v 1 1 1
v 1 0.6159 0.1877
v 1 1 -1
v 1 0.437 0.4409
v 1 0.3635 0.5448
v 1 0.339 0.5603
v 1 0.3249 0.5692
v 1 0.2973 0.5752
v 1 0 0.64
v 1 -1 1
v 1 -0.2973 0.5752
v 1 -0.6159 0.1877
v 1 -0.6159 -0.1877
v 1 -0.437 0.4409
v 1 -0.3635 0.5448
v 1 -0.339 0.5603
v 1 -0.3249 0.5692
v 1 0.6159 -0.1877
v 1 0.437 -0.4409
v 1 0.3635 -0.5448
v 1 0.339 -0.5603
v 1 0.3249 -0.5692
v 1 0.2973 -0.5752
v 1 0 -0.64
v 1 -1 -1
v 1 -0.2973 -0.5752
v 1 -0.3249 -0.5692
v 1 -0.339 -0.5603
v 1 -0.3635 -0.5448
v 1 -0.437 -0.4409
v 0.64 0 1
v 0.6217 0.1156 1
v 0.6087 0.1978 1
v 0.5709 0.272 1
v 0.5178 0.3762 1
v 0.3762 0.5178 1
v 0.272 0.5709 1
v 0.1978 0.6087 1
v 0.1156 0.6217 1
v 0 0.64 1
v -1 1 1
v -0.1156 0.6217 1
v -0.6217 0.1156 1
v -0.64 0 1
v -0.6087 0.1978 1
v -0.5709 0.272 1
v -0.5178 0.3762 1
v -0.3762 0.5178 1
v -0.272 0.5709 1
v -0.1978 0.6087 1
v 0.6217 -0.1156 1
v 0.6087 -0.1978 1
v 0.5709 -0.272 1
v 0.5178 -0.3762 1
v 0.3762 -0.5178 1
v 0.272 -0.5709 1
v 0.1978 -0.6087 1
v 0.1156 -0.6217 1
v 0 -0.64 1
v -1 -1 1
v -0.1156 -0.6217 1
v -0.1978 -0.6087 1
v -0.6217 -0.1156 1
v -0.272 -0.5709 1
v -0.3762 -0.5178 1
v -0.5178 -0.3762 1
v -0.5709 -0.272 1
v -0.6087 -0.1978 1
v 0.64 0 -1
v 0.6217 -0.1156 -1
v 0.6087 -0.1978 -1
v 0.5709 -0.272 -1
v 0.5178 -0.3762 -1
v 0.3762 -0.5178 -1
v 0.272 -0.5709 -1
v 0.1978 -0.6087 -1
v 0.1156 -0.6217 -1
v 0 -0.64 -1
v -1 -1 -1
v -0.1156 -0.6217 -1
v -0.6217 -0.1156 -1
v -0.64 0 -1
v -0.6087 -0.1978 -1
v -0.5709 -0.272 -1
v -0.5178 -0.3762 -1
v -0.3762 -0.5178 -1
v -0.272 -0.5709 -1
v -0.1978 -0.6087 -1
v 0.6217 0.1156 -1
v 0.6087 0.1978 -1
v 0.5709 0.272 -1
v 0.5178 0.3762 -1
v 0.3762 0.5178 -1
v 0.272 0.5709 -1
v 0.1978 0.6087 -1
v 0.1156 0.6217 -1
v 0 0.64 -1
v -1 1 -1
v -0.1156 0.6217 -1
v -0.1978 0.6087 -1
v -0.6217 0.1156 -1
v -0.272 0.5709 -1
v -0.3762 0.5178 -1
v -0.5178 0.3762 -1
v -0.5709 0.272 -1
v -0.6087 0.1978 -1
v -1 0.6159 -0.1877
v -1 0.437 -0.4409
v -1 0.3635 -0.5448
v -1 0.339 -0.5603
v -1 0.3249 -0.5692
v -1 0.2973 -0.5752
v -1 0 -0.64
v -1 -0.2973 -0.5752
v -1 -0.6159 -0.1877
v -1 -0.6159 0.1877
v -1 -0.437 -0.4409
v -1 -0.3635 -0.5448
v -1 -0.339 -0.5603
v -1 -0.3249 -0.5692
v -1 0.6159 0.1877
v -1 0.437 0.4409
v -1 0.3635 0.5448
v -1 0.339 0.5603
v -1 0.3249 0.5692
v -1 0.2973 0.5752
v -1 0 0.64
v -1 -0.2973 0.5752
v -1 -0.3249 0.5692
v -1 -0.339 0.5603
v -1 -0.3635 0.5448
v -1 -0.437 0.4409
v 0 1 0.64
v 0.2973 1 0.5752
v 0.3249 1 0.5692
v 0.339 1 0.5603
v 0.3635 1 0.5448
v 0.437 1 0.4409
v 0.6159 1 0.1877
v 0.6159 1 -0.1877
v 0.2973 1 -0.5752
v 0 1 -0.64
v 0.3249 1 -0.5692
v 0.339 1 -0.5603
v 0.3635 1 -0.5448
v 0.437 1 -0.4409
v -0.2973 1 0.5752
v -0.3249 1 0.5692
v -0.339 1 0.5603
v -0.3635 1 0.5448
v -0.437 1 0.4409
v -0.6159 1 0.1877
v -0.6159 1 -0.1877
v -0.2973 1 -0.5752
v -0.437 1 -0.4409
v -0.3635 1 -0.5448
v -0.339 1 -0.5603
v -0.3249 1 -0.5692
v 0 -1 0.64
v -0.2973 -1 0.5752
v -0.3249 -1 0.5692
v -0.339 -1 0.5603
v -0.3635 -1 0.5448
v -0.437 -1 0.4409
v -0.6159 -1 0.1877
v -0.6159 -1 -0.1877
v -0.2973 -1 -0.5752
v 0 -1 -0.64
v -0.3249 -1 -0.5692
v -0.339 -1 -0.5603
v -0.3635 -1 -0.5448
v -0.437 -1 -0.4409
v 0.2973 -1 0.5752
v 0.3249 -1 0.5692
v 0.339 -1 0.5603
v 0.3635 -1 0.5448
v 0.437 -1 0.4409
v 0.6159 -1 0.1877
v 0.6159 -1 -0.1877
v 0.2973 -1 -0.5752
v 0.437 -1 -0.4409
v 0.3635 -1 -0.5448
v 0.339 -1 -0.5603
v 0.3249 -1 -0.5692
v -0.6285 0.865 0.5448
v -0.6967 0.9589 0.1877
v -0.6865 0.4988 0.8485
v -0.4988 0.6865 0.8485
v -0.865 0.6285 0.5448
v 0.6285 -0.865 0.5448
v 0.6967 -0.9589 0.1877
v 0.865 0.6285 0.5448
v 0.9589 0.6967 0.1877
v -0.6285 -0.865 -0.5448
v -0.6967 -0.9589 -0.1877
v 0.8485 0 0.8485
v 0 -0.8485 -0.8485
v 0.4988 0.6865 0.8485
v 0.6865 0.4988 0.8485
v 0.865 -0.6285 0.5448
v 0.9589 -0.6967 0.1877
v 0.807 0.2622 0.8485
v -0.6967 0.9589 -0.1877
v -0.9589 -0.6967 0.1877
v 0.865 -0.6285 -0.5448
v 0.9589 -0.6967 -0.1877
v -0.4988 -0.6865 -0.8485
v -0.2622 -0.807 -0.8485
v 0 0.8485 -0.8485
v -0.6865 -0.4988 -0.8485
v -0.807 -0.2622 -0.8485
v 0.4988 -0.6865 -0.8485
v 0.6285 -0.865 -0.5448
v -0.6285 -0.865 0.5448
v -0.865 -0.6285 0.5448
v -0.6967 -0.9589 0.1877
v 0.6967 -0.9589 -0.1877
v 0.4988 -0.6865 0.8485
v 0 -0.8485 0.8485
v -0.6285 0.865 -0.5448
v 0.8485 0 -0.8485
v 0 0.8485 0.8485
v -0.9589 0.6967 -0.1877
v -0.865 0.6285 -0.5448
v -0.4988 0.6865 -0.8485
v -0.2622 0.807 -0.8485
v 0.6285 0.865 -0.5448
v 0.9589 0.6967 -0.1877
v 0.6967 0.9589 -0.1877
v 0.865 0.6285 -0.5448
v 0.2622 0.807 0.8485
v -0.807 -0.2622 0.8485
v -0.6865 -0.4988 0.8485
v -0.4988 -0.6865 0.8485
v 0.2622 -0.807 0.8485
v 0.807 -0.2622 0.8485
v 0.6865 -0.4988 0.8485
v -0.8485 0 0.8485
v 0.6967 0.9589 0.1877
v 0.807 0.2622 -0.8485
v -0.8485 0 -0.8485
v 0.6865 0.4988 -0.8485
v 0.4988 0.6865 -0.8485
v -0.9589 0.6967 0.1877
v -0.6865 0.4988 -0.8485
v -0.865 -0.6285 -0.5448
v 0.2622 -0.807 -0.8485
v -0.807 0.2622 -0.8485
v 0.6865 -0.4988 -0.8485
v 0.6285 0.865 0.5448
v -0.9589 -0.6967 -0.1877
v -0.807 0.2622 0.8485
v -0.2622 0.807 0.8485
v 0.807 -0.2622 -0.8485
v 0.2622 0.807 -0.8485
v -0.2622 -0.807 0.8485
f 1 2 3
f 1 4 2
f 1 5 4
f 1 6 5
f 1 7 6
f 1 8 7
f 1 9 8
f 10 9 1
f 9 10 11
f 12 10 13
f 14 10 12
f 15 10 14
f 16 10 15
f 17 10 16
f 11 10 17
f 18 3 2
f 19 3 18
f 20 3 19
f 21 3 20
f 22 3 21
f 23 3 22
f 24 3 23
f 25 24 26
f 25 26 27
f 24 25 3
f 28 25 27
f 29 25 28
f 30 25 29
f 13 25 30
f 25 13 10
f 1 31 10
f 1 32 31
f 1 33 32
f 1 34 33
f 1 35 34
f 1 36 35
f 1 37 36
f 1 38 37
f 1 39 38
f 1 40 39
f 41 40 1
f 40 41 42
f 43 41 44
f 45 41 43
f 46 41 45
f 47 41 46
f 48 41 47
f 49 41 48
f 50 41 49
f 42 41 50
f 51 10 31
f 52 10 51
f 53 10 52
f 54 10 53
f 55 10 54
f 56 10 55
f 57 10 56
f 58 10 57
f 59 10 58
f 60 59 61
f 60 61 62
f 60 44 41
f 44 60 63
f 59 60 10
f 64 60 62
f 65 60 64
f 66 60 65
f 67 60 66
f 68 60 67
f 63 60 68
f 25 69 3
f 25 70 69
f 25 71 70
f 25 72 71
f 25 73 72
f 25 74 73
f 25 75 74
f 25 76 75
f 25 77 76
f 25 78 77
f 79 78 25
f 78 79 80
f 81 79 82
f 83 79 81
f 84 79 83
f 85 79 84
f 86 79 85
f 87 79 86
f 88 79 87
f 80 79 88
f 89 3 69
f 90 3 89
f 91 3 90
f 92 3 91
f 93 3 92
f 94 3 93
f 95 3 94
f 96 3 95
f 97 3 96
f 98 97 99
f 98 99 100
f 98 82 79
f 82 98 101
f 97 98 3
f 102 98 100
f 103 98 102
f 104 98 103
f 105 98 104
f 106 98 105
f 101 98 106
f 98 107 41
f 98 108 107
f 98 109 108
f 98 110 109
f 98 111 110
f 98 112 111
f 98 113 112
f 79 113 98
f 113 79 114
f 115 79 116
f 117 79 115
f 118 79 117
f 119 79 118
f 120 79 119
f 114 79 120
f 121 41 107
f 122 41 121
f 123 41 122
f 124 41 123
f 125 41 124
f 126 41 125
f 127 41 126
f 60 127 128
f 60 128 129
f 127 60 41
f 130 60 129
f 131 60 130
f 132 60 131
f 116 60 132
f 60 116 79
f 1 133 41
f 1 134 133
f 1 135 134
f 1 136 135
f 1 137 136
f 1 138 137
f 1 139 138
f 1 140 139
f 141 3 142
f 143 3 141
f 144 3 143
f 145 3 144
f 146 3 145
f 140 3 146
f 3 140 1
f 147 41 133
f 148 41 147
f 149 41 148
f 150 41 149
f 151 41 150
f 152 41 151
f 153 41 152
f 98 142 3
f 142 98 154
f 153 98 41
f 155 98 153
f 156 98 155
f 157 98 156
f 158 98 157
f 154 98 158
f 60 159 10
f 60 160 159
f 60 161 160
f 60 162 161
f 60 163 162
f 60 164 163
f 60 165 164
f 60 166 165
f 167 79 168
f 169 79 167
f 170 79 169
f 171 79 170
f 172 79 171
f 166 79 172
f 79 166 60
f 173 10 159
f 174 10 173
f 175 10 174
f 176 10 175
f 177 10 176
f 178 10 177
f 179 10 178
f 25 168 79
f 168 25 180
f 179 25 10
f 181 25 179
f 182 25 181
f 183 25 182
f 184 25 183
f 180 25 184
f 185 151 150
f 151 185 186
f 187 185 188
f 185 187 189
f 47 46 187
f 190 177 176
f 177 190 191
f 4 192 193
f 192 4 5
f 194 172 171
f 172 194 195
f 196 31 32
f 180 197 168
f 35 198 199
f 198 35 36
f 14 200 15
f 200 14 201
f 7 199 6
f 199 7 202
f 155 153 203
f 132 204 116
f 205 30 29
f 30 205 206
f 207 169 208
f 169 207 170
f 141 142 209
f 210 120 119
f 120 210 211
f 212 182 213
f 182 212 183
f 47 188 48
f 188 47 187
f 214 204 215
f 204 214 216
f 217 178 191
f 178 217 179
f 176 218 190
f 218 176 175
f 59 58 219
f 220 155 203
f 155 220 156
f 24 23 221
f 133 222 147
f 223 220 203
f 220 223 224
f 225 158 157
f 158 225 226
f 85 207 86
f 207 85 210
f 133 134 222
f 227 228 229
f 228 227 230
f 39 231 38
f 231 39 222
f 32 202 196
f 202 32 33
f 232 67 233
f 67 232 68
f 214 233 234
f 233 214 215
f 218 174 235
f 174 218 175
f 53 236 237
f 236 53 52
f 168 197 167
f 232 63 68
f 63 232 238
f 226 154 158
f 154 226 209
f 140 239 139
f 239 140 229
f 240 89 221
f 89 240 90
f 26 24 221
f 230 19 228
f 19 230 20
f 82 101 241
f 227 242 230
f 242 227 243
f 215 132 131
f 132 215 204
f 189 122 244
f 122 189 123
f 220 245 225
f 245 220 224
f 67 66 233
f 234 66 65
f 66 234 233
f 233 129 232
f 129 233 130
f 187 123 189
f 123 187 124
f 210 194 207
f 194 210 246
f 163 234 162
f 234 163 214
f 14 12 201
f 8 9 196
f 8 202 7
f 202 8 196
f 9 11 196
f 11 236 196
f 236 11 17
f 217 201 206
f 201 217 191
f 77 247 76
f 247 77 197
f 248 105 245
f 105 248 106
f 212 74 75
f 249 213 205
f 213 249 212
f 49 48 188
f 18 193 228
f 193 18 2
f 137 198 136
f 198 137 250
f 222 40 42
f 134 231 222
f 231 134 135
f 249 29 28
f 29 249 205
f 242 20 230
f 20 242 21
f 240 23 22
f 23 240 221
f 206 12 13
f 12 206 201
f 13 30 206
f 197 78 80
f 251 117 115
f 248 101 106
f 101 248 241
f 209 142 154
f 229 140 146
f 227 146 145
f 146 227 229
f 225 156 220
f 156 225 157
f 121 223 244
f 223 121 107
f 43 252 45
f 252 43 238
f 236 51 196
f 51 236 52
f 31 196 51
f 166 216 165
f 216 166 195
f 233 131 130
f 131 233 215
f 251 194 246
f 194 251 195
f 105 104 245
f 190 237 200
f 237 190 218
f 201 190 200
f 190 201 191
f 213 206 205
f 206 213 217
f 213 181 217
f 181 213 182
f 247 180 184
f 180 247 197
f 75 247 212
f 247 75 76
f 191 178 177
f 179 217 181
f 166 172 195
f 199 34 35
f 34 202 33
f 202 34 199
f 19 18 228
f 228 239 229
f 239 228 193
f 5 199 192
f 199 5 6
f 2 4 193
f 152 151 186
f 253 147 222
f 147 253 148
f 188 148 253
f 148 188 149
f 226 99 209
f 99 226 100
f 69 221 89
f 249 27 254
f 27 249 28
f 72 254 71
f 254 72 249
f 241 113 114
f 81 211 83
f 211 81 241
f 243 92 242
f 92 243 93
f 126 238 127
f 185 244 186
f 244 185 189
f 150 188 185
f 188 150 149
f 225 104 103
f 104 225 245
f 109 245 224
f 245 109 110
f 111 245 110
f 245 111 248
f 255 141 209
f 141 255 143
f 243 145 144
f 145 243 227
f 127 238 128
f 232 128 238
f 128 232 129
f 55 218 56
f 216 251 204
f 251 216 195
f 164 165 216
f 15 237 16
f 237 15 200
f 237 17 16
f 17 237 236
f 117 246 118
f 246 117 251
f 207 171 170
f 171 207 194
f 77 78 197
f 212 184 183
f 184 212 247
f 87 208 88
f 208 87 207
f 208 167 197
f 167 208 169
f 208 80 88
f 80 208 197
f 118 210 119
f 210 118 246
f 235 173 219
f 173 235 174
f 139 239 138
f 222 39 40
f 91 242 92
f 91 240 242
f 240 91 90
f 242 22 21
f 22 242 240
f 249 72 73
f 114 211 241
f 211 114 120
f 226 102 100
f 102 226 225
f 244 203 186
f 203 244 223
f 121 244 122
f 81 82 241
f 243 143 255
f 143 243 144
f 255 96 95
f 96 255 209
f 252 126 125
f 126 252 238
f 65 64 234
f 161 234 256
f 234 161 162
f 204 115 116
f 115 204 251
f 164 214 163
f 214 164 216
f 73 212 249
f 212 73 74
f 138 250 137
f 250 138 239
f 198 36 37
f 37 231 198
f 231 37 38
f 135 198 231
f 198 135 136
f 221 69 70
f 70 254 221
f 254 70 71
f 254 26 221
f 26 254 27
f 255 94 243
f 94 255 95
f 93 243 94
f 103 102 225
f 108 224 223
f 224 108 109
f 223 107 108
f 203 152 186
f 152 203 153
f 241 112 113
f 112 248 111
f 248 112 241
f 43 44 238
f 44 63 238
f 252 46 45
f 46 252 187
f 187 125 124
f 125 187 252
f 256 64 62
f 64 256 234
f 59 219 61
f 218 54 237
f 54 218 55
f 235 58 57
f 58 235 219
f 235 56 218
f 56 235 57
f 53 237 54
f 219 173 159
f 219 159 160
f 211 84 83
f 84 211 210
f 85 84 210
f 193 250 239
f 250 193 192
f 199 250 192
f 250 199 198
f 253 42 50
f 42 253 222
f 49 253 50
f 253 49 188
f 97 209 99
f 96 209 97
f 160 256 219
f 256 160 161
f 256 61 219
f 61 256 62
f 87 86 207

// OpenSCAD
difference() {
  cube(size=2,center=true);
  sphere(r=1.2,$fn=20);
  %cube(size=[1,1,2.01], center=true);
  %rotate([90,0,0]) cube(size=[1,1,2.01], center=true);
  %rotate([0,90,0]) cube(size=[1,1,2.01], center=true);

}
